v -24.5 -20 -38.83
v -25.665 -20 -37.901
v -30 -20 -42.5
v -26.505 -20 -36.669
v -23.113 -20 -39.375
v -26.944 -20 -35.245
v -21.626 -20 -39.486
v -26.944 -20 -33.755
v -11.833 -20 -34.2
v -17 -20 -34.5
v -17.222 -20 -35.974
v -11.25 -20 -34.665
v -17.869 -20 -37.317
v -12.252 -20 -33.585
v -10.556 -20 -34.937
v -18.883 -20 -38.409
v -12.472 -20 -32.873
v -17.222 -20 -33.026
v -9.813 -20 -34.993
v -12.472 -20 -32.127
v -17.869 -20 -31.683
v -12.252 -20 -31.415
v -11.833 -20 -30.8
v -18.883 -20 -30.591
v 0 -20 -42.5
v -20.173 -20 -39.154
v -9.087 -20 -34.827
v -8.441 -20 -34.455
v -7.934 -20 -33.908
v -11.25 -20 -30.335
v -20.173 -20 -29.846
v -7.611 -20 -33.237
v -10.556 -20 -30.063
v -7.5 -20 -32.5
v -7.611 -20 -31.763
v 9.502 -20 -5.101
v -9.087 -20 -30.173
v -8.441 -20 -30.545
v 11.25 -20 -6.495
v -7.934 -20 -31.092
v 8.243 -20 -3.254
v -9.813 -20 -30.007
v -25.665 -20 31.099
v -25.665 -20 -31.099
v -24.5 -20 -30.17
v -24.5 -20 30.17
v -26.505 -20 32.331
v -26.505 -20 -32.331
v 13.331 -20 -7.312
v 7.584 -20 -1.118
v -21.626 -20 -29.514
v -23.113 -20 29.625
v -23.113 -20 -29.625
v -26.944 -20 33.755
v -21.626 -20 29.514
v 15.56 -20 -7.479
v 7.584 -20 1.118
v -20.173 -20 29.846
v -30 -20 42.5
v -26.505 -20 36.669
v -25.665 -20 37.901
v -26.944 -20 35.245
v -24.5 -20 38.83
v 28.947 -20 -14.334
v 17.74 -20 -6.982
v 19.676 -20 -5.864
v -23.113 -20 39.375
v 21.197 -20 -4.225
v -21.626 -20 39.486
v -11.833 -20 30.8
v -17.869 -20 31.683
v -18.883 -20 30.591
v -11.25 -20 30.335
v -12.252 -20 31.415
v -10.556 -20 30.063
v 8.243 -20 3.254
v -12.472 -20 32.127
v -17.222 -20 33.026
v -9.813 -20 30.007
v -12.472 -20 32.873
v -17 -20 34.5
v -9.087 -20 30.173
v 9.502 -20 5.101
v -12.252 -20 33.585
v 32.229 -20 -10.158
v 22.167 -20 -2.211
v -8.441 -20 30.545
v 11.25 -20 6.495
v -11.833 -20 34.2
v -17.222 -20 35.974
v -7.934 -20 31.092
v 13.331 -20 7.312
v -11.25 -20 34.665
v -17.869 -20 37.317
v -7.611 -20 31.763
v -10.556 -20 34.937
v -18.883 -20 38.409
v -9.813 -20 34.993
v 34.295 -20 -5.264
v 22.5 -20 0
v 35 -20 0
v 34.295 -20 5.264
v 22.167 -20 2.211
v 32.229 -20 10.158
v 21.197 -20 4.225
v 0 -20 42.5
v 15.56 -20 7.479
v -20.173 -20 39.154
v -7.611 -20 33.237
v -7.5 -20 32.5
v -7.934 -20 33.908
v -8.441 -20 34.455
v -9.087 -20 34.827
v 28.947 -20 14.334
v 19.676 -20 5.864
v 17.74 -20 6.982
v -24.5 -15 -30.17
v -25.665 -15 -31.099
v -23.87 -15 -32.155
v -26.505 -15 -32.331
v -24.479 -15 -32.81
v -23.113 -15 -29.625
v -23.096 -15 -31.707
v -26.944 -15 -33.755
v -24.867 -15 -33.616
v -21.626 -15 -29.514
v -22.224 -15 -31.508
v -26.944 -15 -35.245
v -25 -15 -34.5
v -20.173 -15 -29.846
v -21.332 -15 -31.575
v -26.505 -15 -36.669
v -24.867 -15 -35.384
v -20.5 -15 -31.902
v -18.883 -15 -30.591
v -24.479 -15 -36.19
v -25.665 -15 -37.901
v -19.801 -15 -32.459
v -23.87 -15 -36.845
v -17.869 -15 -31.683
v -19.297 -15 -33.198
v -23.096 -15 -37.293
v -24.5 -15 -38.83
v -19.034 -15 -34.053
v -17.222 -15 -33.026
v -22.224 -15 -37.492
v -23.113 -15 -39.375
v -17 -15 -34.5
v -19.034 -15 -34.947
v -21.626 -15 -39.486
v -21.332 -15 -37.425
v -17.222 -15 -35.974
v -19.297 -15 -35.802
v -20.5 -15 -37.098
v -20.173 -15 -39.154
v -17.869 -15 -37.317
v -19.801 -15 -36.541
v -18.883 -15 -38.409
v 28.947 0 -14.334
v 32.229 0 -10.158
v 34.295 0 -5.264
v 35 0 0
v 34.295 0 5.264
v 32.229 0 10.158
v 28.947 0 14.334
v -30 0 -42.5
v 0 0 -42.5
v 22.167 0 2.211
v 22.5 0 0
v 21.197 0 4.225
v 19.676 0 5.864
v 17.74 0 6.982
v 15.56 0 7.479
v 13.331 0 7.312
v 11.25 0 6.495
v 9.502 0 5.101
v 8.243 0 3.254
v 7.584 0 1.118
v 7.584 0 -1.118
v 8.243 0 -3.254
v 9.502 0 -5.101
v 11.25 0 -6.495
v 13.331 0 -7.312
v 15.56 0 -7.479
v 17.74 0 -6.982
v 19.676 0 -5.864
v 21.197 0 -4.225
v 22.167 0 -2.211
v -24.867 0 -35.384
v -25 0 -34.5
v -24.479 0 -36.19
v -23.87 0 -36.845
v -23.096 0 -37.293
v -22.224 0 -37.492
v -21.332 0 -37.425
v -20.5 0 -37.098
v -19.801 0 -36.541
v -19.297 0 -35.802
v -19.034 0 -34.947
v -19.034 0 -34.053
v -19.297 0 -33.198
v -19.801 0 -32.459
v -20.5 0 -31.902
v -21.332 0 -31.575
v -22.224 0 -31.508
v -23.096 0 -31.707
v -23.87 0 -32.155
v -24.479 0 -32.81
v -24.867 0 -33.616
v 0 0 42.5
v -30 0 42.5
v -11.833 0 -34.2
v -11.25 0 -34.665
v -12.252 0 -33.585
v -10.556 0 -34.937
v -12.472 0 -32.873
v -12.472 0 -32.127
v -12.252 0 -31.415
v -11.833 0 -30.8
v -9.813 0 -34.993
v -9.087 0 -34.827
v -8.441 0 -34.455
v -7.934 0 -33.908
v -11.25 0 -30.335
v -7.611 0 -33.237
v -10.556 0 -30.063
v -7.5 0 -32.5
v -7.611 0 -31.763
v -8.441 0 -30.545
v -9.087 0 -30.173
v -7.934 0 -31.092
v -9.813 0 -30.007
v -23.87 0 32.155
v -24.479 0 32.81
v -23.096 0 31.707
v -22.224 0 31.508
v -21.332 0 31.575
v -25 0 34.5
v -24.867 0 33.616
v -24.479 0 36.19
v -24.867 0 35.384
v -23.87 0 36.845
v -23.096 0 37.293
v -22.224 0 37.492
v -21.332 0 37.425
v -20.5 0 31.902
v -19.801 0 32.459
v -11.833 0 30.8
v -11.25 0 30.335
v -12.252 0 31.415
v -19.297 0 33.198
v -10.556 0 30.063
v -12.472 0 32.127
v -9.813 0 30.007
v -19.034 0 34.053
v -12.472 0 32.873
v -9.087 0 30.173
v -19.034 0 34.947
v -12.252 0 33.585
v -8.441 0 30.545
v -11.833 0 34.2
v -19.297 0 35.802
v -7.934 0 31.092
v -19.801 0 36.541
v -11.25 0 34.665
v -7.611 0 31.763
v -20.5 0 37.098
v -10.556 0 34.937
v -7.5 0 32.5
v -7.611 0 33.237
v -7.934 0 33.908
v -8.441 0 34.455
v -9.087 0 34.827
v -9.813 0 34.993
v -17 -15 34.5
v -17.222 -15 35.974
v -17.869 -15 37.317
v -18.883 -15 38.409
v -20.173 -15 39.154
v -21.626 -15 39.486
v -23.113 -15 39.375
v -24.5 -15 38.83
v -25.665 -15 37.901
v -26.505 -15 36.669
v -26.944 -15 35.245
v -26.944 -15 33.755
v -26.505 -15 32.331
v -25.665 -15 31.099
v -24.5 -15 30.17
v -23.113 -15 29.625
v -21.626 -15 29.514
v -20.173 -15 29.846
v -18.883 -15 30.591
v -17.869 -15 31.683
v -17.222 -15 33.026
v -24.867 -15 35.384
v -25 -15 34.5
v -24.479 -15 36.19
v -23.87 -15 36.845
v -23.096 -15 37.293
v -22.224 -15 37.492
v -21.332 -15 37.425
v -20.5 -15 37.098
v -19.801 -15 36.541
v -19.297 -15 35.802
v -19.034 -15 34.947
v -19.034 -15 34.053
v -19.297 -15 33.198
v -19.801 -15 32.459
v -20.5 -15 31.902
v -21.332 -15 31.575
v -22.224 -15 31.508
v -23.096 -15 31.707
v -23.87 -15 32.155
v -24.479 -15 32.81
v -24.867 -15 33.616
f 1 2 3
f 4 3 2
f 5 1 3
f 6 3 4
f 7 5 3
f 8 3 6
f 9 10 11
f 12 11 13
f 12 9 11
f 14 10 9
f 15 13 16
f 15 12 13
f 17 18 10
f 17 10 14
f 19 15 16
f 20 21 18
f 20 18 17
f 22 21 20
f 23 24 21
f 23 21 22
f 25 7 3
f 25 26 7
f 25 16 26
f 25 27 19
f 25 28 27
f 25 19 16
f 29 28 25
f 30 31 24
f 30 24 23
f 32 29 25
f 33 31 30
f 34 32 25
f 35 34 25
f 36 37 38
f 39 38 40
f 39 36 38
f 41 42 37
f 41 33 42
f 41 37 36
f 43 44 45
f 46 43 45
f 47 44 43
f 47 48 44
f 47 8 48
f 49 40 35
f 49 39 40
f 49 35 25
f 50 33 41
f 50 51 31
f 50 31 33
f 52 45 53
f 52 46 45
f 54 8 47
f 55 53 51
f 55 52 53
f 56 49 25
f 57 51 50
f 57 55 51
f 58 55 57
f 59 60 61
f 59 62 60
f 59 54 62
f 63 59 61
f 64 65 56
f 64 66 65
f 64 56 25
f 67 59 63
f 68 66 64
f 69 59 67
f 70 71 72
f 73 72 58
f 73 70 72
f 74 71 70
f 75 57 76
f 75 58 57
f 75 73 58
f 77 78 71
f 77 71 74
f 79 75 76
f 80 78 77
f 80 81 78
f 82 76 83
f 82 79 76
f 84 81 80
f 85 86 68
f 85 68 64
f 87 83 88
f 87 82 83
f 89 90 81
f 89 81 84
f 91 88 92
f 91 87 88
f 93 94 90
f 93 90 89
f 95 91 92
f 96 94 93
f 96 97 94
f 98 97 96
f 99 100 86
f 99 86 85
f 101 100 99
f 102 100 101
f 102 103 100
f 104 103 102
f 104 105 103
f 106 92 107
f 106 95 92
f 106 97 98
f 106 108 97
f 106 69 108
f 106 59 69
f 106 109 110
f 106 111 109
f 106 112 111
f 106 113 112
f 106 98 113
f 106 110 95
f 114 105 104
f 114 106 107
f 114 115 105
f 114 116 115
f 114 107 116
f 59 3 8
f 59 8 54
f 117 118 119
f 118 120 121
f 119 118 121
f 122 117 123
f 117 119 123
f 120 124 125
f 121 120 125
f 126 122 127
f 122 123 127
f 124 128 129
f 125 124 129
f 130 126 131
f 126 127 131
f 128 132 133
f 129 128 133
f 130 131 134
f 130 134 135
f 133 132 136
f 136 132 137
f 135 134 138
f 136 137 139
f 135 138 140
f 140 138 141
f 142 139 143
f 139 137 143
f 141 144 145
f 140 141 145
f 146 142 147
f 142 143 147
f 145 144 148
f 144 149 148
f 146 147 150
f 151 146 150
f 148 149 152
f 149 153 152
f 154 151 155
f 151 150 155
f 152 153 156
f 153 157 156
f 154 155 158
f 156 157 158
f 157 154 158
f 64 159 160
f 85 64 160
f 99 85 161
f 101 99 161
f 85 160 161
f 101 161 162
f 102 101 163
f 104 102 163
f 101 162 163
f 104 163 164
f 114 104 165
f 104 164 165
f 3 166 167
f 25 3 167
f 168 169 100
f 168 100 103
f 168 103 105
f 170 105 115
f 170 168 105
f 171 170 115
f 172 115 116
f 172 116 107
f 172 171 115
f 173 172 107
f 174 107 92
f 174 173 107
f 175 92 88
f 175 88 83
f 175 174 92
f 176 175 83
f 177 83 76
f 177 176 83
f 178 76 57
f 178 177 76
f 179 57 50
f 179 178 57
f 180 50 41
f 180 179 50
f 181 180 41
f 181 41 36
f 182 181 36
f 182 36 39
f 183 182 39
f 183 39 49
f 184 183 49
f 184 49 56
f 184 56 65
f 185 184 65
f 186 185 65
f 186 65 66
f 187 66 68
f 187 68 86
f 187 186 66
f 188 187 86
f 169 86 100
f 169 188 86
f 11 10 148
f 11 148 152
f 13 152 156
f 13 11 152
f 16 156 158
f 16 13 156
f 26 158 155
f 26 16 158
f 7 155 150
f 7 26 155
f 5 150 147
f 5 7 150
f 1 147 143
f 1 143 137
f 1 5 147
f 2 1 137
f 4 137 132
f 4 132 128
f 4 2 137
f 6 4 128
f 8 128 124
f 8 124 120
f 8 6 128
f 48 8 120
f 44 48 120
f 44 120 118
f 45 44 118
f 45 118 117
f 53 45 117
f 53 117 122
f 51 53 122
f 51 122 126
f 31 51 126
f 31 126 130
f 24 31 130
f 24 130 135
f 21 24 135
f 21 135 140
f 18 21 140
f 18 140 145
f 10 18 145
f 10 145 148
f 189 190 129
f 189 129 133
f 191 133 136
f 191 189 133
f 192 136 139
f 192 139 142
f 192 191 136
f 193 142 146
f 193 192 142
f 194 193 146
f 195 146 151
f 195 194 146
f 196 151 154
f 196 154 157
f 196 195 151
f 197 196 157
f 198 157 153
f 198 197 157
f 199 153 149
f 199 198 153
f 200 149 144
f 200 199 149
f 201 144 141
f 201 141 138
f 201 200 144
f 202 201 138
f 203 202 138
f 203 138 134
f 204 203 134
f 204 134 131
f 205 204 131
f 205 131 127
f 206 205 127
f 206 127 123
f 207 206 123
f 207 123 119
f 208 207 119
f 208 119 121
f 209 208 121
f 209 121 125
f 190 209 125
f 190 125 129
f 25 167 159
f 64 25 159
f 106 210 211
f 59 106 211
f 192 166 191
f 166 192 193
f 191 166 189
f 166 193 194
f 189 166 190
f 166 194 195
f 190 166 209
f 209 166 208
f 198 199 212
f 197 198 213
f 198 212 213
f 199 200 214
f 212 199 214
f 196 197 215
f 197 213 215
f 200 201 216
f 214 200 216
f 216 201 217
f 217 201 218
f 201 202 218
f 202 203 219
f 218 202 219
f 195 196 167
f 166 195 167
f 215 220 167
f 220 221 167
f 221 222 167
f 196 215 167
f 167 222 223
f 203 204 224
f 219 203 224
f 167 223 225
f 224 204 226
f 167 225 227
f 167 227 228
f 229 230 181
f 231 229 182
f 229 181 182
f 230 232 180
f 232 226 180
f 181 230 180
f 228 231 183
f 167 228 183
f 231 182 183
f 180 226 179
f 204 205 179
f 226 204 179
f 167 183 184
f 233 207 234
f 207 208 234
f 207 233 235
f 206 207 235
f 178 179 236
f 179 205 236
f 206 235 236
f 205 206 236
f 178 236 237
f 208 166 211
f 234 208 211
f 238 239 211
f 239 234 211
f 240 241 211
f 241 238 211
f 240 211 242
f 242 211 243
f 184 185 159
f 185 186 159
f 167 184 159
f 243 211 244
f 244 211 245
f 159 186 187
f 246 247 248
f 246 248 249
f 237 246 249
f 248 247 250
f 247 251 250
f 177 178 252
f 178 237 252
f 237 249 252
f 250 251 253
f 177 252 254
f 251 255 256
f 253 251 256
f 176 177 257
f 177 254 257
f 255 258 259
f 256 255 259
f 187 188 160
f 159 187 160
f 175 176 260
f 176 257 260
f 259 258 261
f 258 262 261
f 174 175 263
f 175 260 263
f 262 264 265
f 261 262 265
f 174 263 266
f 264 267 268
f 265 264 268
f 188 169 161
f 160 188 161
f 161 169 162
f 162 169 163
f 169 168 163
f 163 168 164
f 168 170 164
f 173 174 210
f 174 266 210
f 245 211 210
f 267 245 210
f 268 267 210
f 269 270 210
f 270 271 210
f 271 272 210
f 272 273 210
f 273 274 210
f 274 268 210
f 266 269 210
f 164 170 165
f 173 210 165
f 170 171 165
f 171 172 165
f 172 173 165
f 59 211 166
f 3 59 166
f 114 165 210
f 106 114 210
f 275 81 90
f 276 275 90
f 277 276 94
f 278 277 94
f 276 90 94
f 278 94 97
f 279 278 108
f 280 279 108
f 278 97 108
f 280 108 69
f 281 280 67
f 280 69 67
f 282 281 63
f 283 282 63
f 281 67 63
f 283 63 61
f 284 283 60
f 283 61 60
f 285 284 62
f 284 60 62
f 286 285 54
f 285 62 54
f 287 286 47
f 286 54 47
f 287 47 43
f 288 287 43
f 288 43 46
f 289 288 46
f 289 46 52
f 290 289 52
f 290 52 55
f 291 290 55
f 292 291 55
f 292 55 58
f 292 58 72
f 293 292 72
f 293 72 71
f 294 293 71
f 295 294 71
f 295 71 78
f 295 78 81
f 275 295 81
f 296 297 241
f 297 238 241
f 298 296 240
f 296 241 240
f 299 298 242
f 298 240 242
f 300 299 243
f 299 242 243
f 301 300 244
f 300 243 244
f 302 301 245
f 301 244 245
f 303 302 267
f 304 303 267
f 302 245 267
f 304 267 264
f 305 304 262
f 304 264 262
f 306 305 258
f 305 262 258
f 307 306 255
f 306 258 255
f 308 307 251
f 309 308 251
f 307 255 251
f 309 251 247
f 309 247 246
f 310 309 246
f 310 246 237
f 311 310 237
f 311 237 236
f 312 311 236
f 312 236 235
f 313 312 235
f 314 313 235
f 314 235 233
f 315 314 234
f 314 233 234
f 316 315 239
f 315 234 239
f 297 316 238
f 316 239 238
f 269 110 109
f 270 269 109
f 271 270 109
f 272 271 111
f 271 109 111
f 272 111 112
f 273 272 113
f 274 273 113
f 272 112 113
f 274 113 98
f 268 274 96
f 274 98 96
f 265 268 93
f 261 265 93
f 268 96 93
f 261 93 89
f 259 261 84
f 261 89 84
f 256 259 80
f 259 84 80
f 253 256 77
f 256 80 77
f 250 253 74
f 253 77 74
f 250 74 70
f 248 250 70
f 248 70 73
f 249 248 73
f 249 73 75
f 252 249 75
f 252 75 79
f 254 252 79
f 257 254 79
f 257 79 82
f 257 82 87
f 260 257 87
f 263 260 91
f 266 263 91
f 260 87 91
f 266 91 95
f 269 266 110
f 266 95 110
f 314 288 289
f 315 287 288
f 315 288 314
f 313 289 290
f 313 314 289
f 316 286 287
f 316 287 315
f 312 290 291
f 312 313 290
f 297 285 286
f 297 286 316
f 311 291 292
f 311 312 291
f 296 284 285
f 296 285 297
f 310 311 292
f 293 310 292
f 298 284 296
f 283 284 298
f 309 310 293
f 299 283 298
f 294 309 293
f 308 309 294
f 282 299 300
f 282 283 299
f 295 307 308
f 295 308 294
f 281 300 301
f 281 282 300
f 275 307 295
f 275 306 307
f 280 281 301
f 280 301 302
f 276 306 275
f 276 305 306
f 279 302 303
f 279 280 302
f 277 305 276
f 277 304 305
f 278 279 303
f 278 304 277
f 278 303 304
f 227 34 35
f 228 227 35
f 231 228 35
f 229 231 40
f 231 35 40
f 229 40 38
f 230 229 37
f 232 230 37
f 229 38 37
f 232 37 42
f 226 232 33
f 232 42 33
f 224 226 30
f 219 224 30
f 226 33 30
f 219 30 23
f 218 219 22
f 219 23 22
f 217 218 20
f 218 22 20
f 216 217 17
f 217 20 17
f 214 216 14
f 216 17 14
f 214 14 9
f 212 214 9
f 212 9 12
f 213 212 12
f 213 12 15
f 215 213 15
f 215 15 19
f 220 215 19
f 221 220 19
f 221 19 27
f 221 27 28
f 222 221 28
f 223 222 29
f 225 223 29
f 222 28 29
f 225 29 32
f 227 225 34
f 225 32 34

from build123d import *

# Parameters (mm, degrees)
F0_R           = 7.5
F1_DEPTH       = 20
F2_R           = 2.5
F3_DEPTH       = 20
F5_D           = 6
F5_DEPTH       = 20
F5_CBORE_D     = 10
F5_CBORE_DEPTH = 5
F5_TIP         = 1.8025818571


# Not quite as in the source:
# - a pattern or mirror of a feature is missing from the dataset's text; its kind, count and spacing are read off the source's solid


with BuildPart() as f1:
    # F0 (on Front) → F1 (new body)
    with BuildSketch(Plane.XZ):
        with BuildLine():
            Line((0, 42.5), (-30, 42.5))
            Line((-30, 42.5), (-30, -42.5))
            Line((-30, -42.5), (0, -42.5))
            Line((0, -42.5), (28.9472864716, -14.3343364017))
            ThreePointArc((28.9472864716, -14.3343364017), (35, 0), (28.9472864716, 14.3343364017))
            Line((28.9472864716, 14.3343364017), (0, 42.5))
        make_face()
        with Locations((15, 0)):
            Circle(F0_R, mode=Mode.SUBTRACT)
    extrude(amount=F1_DEPTH)

    # F2 (on face) → F3 (cut, through all)
    with BuildSketch(Plane.XZ.offset(20)):
        with Locations((-10, 32.5)):
            Circle(F2_R)
        with Locations((-10, -32.5)):
            Circle(F2_R)
    extrude(amount=-F3_DEPTH, mode=Mode.SUBTRACT)

    # F5
    with Locations(Plane.XZ.offset(20)):
        with Locations((-22, 34.5)):
            f5 = CounterBoreHole(F5_D / 2, F5_CBORE_D / 2, F5_CBORE_DEPTH, depth=F5_DEPTH)
            with Locations((0, 0, -(F5_DEPTH + F5_TIP / 2))):  # 118° drill point
                Cone(0, F5_D / 2, F5_TIP, mode=Mode.SUBTRACT)

    # F5_copies: F5 across plane
    add(f5.mirror(Plane(origin=(0, 0, 0), x_dir=(-1, 0, 0), z_dir=(0, 0, -1))), mode=Mode.SUBTRACT)


solid = f1.part
